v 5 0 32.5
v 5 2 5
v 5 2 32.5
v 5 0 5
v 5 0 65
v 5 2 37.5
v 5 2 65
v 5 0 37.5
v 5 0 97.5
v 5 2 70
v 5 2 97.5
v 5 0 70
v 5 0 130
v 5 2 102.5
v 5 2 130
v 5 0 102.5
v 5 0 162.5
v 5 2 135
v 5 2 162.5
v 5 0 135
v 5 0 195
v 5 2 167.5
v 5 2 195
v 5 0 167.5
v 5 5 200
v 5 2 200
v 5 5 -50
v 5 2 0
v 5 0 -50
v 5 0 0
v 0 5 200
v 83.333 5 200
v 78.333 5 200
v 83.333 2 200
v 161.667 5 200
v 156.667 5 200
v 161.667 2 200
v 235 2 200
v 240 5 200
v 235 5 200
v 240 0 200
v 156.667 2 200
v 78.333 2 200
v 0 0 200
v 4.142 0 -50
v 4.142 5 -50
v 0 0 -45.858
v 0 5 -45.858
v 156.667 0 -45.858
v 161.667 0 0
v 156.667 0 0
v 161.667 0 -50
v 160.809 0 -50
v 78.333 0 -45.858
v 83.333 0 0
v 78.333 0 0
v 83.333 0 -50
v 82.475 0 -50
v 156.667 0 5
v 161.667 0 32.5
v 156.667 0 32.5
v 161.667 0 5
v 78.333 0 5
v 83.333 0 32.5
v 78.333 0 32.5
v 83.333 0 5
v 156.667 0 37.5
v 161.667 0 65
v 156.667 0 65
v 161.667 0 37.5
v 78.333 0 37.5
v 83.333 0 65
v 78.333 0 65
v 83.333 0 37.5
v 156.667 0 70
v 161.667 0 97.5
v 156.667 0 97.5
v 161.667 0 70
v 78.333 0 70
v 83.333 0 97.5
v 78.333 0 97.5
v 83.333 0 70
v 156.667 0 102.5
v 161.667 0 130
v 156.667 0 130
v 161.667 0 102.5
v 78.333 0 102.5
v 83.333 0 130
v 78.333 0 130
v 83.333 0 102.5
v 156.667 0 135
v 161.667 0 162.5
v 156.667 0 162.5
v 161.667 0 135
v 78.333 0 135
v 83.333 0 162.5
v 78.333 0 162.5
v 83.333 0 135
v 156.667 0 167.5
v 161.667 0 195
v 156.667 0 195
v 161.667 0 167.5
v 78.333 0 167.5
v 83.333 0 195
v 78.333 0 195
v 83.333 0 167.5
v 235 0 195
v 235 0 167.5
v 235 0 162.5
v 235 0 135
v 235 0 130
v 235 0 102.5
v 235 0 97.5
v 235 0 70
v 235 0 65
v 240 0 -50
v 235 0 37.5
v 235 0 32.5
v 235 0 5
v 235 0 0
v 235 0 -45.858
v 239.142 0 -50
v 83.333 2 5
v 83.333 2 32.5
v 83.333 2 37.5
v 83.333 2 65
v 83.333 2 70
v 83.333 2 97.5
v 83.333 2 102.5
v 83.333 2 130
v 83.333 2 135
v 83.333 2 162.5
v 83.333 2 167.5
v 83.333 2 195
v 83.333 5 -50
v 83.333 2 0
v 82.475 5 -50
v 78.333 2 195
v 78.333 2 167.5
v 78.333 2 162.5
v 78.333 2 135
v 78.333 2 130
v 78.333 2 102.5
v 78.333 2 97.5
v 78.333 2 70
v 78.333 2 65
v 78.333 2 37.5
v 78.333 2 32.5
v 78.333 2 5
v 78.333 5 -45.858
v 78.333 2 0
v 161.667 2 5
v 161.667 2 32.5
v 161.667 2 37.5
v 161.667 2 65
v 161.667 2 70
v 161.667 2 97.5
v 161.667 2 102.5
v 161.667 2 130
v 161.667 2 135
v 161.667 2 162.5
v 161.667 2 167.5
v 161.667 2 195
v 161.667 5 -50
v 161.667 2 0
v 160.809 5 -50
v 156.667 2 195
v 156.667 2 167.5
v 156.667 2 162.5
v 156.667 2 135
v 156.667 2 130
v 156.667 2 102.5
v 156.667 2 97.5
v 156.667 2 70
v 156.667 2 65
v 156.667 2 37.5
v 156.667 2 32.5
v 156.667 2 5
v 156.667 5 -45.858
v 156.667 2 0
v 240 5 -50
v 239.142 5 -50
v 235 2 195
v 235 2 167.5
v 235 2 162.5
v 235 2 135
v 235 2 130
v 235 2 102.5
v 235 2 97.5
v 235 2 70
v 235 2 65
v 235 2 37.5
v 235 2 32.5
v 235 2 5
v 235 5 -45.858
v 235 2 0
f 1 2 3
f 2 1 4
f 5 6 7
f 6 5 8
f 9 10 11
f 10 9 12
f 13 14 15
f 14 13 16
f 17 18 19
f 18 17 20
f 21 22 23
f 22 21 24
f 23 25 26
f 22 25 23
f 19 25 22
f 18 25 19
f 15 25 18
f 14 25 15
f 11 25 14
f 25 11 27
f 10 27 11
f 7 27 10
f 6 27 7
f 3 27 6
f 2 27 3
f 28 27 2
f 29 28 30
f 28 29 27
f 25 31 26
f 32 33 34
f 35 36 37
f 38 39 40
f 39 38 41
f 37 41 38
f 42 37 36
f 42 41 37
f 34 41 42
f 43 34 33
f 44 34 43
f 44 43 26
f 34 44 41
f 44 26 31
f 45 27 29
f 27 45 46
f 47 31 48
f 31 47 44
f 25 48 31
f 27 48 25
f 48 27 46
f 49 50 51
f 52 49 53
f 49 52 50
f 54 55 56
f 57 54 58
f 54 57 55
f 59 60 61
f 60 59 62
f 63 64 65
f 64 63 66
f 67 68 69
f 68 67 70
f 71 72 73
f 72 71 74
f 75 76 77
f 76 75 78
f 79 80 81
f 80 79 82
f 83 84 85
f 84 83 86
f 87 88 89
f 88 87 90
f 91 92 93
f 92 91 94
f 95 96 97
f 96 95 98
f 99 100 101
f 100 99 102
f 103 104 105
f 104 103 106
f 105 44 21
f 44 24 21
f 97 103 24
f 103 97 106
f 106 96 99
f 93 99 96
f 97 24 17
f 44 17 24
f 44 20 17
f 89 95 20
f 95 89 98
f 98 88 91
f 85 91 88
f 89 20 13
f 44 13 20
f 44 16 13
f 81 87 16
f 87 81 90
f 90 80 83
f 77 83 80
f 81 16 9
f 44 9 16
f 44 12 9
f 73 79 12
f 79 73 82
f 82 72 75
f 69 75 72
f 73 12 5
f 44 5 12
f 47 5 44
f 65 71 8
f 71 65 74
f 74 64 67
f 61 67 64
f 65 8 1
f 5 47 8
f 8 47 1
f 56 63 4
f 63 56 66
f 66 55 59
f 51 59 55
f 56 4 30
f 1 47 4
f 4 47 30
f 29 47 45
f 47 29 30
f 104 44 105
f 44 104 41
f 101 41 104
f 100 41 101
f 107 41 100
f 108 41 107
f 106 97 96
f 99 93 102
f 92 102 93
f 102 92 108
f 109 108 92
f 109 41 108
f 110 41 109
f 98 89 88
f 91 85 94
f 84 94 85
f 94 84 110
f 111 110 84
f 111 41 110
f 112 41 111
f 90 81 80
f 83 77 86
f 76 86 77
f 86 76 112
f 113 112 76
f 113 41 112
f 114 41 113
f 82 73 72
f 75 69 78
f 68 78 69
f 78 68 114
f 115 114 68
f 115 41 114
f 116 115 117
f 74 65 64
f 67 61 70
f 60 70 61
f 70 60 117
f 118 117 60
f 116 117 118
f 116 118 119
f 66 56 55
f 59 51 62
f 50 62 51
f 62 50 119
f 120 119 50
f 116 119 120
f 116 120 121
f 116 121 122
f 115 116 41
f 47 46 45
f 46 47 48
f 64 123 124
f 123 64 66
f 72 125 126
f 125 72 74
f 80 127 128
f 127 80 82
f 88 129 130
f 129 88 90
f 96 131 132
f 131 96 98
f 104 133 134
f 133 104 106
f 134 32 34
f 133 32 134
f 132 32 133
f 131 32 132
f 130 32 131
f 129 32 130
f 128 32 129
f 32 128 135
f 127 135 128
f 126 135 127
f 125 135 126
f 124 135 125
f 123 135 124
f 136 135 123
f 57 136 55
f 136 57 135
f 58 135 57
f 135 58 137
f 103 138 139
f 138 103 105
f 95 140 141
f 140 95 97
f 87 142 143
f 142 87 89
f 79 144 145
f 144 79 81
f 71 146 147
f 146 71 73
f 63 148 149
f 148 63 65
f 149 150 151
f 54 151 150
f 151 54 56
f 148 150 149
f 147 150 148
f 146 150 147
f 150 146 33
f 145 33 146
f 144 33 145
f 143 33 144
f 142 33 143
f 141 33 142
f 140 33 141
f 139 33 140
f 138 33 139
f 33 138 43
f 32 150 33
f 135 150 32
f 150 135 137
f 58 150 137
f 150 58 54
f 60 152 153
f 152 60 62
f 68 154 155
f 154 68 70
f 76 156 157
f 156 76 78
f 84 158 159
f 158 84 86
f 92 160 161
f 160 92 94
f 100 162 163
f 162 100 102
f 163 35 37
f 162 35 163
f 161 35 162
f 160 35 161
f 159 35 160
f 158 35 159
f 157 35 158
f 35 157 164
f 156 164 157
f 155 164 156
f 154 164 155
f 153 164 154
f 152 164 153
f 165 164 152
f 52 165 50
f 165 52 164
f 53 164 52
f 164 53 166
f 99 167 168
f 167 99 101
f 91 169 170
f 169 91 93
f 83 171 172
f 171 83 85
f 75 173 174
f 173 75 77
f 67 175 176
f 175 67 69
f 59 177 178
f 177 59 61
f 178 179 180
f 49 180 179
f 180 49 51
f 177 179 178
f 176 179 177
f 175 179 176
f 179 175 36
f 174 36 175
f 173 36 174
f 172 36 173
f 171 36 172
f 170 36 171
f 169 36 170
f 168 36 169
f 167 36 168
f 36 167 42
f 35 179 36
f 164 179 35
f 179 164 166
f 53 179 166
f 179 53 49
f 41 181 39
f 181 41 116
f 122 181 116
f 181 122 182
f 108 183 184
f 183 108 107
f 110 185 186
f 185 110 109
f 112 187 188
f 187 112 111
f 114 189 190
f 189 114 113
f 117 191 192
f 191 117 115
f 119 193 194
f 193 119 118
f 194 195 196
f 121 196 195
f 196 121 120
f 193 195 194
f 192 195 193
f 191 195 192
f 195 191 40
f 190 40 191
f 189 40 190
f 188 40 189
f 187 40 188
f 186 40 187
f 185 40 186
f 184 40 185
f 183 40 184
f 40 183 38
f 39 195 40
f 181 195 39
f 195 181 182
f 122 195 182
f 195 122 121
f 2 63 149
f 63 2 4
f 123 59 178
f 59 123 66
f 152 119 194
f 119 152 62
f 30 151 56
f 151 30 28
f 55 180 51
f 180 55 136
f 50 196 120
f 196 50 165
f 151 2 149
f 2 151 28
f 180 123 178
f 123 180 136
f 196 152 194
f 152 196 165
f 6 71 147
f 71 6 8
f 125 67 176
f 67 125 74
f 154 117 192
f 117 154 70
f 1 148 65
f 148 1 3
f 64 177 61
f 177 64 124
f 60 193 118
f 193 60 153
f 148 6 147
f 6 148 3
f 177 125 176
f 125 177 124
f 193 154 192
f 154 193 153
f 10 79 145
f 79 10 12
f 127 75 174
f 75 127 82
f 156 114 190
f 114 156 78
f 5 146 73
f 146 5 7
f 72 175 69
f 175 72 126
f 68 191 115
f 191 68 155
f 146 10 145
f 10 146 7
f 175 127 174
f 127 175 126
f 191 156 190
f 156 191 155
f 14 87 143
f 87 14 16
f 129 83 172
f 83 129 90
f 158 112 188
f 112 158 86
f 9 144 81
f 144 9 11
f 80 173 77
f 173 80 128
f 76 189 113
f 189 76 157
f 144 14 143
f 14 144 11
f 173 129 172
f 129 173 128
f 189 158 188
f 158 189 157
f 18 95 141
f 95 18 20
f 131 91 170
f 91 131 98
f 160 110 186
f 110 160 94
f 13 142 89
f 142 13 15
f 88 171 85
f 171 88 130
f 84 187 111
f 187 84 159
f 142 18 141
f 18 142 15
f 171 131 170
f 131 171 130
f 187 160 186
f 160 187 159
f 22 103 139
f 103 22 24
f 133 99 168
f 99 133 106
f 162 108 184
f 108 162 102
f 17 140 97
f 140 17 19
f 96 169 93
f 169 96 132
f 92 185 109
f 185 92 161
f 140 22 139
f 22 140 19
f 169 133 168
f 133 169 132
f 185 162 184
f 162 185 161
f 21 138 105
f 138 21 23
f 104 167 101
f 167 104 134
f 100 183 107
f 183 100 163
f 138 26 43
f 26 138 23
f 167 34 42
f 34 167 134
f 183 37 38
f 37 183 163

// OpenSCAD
stakes = 4;
rails = 7;
stakewidth = 5;
railwidth = 2;
railheight = 5;
height = 200;
width = 240;
stakedepth = 50;

stakegap = (width-stakewidth) / (stakes - 1);

for (pos = [0 : stakegap : width - stakewidth]) {
    translate([pos, 0, -stakedepth]) Stake(stakewidth, height + stakedepth);
}

railgap = (height - railheight) / (rails - 1);

for (pos = [0 : railgap : height - railheight]){
    translate([0, 0, pos]) Rail(width, railheight);
}


module Stake(width, height) {
    difference() {
        cube([width, width, height]);
        translate([0,0,-width*2]) rotate([0,-45,0]) cube(width*2);
    }
}
module Rail(length, height) {
    cube([length, railwidth, height]);
}
